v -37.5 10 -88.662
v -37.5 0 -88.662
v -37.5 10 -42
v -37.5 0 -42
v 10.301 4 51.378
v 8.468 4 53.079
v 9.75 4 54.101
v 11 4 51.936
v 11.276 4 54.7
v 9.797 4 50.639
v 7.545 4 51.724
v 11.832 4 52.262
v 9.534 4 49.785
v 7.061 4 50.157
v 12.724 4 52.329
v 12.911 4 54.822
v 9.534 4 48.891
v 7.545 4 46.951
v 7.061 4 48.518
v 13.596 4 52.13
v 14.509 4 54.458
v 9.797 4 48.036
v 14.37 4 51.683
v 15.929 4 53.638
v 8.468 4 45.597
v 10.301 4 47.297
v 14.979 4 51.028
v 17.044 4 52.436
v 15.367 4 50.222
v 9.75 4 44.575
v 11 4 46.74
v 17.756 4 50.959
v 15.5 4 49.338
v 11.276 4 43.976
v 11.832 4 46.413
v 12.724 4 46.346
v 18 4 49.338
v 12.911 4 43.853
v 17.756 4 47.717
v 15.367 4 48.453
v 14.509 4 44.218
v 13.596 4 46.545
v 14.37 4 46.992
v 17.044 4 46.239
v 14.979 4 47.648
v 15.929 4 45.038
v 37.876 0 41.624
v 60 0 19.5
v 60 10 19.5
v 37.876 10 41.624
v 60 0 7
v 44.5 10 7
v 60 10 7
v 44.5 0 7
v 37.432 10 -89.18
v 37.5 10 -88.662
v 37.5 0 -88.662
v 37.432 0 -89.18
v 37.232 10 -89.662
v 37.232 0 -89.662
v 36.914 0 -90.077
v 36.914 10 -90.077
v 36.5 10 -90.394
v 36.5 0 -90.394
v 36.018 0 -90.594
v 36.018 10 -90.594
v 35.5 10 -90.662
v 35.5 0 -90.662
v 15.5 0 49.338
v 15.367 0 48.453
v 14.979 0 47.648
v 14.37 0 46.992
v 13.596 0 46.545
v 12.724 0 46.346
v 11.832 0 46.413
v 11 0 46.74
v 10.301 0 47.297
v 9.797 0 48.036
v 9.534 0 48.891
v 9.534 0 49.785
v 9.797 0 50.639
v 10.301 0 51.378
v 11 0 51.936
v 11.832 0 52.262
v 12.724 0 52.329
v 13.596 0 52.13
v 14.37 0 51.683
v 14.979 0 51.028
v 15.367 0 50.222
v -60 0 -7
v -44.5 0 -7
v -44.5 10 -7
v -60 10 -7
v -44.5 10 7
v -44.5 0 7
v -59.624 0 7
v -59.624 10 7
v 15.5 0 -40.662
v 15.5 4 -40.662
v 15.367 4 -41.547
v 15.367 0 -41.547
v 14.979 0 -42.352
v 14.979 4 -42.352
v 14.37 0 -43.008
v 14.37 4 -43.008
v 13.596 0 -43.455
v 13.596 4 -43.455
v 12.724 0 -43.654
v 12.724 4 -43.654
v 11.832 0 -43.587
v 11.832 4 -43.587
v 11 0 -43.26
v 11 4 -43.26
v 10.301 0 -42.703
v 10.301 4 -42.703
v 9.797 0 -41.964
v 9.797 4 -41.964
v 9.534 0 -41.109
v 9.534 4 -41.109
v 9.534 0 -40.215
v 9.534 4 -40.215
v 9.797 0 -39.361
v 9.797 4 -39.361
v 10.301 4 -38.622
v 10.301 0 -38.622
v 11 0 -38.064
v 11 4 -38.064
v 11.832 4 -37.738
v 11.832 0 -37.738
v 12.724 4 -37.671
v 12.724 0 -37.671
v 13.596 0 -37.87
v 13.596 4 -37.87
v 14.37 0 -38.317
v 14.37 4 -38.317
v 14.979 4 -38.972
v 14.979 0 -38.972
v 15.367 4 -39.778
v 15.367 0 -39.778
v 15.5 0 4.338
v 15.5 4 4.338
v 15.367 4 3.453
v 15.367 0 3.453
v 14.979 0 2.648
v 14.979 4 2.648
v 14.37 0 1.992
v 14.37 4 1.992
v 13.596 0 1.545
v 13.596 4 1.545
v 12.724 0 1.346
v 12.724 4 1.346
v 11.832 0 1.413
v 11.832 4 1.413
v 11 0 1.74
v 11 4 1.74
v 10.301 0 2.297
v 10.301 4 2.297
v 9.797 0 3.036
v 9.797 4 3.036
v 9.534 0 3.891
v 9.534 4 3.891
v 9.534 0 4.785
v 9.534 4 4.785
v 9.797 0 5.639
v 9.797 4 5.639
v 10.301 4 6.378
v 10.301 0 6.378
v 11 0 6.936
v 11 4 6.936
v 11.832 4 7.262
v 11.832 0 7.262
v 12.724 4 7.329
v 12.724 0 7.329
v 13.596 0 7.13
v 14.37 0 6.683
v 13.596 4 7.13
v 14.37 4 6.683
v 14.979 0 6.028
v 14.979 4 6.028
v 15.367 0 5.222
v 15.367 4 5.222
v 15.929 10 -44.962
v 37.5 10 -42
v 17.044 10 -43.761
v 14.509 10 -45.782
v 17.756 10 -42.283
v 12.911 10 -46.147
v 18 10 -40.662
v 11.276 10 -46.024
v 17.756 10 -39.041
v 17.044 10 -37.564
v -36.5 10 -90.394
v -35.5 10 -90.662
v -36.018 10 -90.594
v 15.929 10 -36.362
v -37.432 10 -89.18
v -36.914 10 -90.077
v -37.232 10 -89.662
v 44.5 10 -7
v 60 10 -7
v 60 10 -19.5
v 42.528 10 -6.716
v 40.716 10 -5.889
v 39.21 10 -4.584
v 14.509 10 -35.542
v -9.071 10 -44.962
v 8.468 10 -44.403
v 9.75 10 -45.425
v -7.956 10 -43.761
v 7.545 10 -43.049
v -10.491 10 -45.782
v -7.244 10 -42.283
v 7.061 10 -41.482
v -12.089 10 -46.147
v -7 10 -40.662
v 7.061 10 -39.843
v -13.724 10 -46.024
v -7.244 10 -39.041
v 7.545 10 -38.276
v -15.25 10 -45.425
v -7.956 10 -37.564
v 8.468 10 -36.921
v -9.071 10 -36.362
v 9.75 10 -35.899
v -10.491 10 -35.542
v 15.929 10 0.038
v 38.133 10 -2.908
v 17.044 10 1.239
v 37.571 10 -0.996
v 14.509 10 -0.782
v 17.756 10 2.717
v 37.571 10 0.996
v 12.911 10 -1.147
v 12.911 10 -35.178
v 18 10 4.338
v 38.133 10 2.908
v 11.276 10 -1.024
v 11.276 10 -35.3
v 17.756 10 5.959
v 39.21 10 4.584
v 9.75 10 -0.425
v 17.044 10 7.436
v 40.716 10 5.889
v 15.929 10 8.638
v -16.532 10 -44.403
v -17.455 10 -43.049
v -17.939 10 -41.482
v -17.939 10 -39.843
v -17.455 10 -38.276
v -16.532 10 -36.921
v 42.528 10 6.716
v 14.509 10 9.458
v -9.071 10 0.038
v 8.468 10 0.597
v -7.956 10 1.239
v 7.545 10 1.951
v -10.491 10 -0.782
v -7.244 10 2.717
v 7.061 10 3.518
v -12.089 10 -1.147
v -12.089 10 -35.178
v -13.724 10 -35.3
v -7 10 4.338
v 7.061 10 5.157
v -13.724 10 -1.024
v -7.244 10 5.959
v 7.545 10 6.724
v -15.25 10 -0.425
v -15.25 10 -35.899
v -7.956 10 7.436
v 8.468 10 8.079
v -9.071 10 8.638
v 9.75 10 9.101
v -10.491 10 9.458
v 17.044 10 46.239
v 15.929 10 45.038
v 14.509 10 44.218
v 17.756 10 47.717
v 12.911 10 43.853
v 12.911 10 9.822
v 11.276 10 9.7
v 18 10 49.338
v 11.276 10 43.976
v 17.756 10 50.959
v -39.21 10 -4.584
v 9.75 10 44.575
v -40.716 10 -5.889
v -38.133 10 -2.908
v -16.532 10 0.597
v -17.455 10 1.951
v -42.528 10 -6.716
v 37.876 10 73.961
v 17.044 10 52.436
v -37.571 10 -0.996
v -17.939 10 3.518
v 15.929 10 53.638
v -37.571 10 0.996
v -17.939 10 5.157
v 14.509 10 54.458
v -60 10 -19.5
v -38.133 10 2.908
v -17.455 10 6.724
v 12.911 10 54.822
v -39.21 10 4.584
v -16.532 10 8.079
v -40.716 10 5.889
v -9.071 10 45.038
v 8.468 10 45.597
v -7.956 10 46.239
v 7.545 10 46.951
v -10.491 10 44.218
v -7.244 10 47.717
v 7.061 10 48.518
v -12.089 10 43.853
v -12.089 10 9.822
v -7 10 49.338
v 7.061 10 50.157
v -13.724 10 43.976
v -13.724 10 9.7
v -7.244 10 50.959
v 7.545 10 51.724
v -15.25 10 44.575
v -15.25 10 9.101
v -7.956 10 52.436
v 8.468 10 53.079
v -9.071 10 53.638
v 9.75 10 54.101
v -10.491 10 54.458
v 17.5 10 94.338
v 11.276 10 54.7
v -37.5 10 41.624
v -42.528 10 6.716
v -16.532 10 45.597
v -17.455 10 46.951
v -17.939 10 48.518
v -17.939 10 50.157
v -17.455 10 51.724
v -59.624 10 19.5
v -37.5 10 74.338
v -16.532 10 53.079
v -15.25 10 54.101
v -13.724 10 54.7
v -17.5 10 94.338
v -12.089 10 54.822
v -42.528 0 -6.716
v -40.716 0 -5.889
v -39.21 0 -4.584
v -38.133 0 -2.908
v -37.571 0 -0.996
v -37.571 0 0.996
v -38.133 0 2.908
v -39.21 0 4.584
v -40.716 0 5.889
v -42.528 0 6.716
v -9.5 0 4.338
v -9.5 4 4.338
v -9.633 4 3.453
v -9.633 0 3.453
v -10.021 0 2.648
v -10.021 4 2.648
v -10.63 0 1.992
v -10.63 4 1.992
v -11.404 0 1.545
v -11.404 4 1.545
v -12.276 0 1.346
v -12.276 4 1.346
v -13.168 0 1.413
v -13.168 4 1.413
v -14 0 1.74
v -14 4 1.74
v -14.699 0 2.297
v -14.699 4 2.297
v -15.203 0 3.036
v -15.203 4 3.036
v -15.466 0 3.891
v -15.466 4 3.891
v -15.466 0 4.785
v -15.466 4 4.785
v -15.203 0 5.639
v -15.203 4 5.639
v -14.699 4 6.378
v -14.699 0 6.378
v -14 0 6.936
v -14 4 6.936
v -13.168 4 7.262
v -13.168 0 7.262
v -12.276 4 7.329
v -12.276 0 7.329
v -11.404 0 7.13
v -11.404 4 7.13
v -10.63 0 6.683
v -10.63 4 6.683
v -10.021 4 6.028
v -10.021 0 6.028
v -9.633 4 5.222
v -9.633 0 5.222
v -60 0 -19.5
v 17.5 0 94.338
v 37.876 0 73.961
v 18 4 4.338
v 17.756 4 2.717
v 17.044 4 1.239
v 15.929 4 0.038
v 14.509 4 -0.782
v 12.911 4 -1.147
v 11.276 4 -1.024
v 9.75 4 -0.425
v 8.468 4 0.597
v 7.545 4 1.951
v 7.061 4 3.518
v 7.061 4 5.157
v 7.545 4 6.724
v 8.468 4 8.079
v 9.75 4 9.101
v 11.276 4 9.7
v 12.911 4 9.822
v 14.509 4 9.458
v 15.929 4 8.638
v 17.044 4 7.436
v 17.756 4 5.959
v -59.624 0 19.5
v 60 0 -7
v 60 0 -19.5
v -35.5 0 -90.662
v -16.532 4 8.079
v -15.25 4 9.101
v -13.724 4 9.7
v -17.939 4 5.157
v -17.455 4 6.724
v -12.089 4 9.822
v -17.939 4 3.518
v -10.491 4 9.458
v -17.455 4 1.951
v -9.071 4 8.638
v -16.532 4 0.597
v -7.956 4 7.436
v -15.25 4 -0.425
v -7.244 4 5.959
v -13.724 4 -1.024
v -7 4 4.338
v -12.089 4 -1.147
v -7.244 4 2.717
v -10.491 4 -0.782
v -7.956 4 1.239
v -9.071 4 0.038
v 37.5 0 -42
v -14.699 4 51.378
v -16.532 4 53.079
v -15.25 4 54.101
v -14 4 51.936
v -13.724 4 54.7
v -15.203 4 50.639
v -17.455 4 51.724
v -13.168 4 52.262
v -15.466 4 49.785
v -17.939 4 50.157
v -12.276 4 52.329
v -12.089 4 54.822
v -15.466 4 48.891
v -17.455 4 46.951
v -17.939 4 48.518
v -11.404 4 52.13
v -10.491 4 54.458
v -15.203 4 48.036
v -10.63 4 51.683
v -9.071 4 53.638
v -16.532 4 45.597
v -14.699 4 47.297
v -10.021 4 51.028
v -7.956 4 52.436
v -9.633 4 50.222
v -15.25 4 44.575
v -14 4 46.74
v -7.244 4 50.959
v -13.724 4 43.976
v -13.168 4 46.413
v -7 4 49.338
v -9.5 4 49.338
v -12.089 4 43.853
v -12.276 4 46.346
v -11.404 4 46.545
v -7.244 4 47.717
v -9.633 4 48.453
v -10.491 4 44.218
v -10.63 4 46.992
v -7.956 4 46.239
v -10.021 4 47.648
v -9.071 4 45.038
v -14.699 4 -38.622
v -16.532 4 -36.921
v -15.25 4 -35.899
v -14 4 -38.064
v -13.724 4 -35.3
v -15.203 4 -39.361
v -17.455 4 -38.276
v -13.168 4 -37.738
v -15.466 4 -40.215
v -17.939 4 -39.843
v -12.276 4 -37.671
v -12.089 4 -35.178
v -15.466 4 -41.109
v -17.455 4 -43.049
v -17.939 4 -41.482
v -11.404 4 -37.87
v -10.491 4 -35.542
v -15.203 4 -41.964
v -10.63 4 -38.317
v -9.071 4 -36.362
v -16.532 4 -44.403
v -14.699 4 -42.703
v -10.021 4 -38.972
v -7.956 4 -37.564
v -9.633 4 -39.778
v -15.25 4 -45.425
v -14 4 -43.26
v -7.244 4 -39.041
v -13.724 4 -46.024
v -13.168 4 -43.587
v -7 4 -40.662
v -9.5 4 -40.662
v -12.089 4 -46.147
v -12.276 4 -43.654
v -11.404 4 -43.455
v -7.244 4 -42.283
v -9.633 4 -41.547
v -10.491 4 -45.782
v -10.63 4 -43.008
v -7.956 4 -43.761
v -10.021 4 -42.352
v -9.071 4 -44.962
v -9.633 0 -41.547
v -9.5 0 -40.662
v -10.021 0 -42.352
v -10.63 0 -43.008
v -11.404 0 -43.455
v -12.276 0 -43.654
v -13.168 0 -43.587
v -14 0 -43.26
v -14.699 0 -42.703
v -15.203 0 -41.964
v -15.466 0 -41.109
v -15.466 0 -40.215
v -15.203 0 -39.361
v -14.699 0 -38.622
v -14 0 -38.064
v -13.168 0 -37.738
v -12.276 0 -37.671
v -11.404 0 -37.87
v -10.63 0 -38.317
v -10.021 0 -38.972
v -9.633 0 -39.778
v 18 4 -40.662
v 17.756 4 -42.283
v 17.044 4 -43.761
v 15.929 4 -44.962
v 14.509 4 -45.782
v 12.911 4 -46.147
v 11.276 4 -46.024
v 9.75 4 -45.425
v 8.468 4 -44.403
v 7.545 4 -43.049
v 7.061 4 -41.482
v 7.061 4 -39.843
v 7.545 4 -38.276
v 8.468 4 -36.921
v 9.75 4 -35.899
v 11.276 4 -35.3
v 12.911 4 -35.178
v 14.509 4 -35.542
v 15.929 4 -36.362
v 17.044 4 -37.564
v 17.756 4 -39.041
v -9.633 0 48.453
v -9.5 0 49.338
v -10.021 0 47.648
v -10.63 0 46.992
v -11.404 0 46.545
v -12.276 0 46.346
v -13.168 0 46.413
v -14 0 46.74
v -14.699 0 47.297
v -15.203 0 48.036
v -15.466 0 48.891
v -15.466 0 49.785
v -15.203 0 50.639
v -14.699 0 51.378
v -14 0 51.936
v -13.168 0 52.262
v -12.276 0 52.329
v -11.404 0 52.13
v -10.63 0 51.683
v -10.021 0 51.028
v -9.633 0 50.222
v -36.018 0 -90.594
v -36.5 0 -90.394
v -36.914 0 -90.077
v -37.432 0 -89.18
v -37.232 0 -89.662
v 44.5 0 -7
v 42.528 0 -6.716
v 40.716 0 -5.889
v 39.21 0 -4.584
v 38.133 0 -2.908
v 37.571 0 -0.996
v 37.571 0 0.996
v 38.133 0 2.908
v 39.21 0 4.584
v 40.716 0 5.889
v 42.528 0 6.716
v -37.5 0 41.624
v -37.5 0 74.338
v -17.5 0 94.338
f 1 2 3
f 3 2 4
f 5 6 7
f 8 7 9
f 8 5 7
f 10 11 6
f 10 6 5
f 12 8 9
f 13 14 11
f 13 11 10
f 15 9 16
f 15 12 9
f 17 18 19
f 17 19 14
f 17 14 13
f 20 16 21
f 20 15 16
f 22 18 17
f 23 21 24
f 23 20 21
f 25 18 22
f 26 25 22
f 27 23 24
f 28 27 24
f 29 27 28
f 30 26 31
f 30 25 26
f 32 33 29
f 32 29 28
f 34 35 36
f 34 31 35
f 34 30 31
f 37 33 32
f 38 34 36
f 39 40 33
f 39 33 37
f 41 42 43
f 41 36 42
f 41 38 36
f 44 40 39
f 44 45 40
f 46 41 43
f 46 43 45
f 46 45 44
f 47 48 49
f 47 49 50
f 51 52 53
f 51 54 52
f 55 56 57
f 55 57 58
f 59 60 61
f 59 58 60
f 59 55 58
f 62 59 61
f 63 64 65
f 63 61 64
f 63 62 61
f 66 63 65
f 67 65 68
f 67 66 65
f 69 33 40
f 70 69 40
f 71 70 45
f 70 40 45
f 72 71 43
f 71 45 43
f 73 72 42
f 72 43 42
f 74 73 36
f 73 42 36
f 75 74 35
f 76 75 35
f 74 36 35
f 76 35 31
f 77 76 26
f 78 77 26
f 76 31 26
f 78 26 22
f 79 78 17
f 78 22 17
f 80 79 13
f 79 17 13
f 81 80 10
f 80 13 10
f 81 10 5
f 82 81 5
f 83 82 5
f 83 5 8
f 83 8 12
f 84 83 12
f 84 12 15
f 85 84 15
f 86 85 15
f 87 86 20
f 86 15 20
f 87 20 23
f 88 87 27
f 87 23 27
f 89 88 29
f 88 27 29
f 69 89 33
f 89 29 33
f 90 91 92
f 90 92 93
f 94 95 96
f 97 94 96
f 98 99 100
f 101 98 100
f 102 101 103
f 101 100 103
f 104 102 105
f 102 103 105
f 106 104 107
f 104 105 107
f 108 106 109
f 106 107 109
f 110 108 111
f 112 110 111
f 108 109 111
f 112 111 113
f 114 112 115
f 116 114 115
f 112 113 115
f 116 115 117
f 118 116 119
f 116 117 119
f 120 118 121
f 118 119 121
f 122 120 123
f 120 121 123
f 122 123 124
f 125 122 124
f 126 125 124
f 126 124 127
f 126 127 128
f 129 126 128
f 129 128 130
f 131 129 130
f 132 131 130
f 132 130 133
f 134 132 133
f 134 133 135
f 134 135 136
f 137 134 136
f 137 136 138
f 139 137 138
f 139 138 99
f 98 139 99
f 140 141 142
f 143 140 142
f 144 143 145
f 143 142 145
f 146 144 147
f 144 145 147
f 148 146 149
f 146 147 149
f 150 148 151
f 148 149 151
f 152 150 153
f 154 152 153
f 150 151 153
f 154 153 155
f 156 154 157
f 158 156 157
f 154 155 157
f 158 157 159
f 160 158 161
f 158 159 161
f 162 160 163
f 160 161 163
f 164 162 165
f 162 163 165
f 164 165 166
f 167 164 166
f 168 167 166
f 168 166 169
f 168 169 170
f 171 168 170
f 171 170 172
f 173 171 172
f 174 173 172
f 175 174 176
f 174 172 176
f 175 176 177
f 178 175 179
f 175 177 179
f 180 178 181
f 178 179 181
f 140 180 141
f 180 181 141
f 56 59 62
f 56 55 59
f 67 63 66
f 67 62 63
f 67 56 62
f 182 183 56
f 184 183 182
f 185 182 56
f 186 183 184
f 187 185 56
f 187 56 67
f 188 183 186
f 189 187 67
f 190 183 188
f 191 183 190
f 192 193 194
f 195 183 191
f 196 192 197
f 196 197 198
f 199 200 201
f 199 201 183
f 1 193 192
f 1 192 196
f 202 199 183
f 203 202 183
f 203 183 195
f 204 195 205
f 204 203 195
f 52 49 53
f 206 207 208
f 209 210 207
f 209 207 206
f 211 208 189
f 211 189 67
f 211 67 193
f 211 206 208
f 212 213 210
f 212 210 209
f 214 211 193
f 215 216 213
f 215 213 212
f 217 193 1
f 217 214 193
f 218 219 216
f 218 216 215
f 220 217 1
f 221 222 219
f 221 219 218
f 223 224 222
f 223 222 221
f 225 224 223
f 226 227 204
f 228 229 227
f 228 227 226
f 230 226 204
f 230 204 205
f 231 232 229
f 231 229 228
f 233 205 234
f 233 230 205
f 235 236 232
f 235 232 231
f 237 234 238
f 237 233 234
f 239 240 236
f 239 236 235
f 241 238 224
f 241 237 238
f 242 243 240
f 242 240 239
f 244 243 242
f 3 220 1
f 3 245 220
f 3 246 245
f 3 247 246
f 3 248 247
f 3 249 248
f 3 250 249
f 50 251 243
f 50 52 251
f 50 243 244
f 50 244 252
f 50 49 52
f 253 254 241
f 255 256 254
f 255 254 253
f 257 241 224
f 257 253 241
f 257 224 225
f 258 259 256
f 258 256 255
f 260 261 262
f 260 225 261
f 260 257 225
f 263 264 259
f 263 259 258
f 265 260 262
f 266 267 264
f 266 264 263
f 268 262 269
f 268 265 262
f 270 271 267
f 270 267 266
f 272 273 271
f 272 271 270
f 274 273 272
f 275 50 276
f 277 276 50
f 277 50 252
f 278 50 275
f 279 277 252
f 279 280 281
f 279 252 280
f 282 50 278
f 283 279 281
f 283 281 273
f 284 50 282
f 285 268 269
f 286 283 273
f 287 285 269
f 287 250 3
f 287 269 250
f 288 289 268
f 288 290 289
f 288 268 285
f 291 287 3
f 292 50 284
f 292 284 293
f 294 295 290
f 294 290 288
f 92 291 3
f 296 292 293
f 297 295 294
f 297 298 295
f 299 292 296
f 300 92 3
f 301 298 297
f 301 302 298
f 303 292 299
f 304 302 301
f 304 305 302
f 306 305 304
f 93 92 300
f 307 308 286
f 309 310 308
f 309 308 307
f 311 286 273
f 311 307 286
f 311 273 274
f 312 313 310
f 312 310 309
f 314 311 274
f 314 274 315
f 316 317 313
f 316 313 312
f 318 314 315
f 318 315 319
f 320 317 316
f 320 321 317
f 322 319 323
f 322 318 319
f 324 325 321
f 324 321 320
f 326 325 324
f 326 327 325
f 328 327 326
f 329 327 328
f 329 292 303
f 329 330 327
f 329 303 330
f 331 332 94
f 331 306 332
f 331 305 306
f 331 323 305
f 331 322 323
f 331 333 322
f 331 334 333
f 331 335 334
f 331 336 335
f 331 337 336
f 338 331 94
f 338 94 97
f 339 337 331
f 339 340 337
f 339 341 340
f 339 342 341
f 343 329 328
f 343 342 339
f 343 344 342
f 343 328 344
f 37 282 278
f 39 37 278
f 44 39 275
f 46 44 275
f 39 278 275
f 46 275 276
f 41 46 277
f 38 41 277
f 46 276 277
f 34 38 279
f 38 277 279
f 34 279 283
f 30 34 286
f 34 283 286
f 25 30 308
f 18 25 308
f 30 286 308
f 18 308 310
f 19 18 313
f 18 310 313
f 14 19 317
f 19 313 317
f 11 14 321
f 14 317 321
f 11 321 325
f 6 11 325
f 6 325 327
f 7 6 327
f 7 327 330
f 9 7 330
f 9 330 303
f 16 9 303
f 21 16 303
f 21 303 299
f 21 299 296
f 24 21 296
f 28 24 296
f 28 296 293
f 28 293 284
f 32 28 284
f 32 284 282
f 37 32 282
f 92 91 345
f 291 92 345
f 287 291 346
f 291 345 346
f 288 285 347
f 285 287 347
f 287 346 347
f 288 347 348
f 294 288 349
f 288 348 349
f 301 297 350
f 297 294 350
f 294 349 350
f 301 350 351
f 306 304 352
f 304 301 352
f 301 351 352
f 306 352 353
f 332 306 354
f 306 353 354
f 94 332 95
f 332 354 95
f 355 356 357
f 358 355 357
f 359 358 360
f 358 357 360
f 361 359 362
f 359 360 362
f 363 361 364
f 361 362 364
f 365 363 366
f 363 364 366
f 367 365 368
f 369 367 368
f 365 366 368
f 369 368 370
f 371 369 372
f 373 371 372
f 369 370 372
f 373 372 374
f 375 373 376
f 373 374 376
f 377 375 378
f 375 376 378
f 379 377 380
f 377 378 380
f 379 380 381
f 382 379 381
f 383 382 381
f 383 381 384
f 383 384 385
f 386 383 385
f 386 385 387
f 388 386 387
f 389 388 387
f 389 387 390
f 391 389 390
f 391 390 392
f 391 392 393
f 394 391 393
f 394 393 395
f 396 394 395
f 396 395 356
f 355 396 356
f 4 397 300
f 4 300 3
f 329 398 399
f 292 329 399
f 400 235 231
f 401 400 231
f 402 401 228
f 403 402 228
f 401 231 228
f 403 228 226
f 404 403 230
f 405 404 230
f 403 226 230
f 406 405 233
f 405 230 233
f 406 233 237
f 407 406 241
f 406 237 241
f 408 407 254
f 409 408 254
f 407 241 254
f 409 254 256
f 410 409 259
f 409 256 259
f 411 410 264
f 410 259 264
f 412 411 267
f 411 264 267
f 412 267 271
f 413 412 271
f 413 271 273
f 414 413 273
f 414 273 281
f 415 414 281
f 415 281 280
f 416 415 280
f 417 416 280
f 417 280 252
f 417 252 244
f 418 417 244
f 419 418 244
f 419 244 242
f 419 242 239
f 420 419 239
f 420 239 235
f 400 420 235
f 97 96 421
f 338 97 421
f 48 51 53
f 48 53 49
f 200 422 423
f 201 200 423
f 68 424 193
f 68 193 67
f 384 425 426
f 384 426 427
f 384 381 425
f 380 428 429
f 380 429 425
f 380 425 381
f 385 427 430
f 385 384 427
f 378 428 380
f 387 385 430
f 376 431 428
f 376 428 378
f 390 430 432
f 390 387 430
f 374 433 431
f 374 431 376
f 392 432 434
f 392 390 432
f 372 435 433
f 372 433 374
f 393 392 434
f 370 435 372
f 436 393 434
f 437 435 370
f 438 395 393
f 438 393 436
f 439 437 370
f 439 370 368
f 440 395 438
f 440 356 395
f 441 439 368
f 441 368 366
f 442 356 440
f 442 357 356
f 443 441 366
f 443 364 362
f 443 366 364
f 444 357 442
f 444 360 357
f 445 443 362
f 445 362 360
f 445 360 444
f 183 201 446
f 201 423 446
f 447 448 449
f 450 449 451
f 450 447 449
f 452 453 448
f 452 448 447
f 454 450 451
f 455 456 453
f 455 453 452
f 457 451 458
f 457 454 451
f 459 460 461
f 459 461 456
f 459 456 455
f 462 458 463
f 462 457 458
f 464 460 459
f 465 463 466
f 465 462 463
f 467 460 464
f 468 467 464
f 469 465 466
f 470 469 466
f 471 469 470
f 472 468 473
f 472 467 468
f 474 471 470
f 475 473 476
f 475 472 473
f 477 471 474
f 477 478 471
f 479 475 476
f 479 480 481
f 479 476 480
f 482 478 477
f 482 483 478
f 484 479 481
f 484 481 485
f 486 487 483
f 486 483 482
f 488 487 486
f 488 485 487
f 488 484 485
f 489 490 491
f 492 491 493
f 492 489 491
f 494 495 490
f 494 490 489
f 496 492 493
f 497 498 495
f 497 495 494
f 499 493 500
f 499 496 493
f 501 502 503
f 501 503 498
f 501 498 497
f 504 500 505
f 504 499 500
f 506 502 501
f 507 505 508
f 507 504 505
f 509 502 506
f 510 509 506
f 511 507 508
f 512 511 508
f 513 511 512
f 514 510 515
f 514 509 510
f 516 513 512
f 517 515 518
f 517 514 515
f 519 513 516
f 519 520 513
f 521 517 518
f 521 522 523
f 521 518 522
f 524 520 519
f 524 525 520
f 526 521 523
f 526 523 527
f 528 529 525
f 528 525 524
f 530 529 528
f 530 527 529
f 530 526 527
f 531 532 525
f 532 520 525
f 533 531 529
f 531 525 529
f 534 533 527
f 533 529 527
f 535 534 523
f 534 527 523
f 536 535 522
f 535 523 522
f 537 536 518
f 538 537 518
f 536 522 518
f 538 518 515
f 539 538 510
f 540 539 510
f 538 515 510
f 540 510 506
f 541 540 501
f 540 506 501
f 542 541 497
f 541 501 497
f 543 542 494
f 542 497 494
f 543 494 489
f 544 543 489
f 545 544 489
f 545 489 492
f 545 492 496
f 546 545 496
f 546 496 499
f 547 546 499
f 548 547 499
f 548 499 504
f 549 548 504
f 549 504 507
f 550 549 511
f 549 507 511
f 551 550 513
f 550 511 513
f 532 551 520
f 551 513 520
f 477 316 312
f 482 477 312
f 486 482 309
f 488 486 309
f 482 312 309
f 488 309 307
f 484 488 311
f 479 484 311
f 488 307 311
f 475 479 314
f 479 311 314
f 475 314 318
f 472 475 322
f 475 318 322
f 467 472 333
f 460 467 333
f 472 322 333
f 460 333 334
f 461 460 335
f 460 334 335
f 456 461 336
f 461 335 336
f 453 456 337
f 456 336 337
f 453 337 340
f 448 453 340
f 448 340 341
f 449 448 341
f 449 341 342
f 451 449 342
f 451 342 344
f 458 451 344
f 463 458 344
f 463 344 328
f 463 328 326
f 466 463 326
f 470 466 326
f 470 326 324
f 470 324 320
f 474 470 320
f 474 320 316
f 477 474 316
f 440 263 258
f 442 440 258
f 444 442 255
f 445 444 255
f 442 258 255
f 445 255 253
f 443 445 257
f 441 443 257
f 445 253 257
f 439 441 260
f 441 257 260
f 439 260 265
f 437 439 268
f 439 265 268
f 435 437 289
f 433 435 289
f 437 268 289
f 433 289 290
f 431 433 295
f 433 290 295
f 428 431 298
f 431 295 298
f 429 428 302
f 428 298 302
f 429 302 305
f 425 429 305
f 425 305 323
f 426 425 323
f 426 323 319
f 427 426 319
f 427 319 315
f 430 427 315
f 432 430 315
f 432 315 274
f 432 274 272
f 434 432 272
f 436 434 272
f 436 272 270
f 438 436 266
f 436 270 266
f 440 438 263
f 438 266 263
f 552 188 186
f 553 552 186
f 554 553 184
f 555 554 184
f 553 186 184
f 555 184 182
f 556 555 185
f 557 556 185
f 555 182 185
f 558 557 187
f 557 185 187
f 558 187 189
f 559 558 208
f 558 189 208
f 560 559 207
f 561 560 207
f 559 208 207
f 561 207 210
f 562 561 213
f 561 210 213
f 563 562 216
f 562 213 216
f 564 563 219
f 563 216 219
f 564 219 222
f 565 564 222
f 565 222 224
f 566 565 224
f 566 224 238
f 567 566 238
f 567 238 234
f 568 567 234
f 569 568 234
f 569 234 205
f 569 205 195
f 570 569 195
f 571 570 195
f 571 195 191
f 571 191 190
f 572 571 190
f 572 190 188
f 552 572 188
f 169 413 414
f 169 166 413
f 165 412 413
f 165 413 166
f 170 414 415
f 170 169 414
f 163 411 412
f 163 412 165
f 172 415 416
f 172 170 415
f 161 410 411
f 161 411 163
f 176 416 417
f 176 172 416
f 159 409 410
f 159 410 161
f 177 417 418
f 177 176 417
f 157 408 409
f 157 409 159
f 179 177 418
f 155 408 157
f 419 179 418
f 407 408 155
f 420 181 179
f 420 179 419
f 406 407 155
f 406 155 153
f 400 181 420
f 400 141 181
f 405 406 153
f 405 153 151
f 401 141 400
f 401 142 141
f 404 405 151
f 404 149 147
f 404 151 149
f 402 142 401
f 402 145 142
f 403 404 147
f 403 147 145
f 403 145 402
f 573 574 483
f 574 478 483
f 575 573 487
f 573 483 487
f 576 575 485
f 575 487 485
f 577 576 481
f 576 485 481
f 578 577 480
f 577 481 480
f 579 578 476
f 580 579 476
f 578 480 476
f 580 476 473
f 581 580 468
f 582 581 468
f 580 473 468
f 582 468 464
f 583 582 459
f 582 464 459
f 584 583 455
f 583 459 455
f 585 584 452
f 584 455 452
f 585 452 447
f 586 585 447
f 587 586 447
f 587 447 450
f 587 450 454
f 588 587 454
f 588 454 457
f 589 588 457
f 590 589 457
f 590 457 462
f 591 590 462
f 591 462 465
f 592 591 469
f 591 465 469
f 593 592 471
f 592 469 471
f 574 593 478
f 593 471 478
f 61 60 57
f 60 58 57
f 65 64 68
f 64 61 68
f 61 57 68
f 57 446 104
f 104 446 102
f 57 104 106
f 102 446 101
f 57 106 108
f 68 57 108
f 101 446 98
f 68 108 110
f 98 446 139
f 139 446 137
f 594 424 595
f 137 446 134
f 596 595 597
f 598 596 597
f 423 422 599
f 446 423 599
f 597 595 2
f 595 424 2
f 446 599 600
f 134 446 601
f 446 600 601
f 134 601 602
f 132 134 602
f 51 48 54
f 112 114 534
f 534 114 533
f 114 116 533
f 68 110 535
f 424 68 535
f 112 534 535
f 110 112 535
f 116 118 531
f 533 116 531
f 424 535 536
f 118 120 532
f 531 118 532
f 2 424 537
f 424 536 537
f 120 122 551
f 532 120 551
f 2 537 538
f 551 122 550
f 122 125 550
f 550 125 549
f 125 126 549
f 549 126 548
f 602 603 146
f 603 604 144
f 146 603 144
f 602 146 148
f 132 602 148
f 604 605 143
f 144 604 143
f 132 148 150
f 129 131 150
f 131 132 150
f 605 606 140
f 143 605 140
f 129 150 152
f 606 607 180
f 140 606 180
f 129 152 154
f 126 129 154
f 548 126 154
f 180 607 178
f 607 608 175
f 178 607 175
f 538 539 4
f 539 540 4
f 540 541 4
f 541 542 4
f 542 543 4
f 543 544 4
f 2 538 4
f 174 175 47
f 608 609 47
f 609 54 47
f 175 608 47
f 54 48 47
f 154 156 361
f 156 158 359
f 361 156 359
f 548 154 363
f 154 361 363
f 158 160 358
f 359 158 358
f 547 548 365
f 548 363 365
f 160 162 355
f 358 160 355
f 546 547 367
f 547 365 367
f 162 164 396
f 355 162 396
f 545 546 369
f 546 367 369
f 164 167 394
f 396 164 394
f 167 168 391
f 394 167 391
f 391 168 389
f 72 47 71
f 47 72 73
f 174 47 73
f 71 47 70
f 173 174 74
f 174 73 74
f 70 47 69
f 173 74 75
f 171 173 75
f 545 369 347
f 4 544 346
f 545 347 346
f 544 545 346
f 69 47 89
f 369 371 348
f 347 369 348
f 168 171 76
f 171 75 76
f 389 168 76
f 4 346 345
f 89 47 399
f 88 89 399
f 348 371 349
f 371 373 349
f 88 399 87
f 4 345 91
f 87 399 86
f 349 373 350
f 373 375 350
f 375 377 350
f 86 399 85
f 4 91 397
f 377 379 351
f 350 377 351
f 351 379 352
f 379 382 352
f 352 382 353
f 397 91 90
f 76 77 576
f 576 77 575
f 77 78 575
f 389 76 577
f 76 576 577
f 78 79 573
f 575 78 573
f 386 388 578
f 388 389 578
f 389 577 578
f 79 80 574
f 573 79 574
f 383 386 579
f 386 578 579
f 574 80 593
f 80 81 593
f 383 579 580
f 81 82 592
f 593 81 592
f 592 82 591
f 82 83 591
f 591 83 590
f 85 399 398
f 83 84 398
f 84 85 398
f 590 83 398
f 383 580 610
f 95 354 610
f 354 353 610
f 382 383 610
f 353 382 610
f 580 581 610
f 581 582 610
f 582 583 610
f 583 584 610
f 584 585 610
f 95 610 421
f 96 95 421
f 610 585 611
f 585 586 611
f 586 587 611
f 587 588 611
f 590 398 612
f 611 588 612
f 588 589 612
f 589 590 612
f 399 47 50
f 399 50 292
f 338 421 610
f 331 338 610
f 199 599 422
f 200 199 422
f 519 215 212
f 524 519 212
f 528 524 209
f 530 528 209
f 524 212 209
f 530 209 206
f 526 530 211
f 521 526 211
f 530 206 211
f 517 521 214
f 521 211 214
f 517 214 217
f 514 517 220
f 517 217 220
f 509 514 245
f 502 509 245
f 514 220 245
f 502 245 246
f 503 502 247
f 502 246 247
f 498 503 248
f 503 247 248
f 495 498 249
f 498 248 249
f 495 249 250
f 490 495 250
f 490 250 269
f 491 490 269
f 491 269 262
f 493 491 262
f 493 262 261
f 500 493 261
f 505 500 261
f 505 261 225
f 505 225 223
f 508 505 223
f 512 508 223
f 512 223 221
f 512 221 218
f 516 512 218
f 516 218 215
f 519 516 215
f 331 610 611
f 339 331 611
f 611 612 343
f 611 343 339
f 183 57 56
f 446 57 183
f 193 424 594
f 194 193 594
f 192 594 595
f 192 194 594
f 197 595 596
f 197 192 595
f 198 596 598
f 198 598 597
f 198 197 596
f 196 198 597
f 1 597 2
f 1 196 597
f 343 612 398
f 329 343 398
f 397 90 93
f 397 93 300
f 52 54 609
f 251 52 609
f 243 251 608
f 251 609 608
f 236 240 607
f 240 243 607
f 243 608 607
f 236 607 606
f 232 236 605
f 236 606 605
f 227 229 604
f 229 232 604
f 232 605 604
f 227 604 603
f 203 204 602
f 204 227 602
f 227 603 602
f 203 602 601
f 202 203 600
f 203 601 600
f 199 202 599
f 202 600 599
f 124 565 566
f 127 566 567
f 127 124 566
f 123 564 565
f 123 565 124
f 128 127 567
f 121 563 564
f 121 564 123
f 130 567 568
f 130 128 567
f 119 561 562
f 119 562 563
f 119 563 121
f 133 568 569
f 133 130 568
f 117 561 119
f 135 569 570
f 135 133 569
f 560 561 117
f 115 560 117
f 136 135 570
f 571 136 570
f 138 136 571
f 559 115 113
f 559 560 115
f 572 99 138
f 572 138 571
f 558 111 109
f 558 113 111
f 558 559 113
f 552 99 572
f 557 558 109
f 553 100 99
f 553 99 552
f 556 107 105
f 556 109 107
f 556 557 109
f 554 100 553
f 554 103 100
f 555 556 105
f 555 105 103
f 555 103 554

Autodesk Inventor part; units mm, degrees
ref_plane "YZ Plane" through (0, 0, 0) normal (1, 0, 0) x (0, 1, 0)
ref_plane "XZ Plane" through (0, 0, 0) normal (0, 1, 0) x (-1, 0, 0)
ref_plane "XY Plane" through (0, 0, 0) normal (0, 0, 1) x (1, 0, 0)
sketch "Sketch1" plane through (0, 0, 0) normal (0, 1, 0) x (-1, 0, 0)
  arc A0 (-44.5, -7) -> (-44.5, 7) centre (-44.5, 0) ccw
  arc A1 (44.5, 7) -> (44.5, -7) centre (44.5, 0) ccw
  line L0 (44.5, 7) -> (59.6236, 7)
  line L1 (44.5, -7) -> (60, -7)
  line L2 (-44.5, 7) -> (-60, 7)
  line L3 (-44.5, -7) -> (-60, -7)
  line L4 (60, -7) -> (60, -19.5)
  line L5 (-60, 7) -> (-60, 19.5)
  line L6 (59.6236, 7) -> (59.6236, 19.5)
  line L7 (-60, -7) -> (-60, -19.5)
  line L8 (37.5, -90.6623) -> (-37.5, -90.6623)
  line L9 (17.5, 94.3377) -> (-17.5, 94.3377)
  line L10 (60, -19.5) -> (37.5, -42)
  line L11 (-60, -19.5) -> (-37.5, -42)
  line L12 (37.5, -90.6623) -> (37.5, -42)
  line L13 (-37.5, -90.6623) -> (-37.5, -42)
  line L14 (59.6236, 19.5) -> (37.5, 41.6236)
  line L15 (-60, 19.5) -> (-37.8764, 41.6236)
  line L16 (37.5, 41.6236) -> (37.5, 74.3377)
  line L17 (-37.8764, 41.6236) -> (-37.8764, 73.9613)
  line L18 (17.5, 94.3377) -> (37.5, 74.3377)
  line L19 (-17.5, 94.3377) -> (-37.8764, 73.9613)
  point P0 (0, 0)
  dimension "d0" = 89
  dimension "d1" = 44.5
  dimension "d5" = 60
  dimension "d10" = 39
  dimension "d11" = 19.5
  dimension "d12" = 19.5
  dimension "d13" = 39
  dimension "d14" = 19.5
  dimension "d15" = 19.5
  dimension "d16" = 75
  dimension "d17" = 37.5
  dimension "d18" = 35
  dimension "d19" = 17.5
  dimension "d20" = 185
  dimension "d22" = 45
  dimension "d23" = 45
  dimension "d24" = 45
  dimension "d25" = 45
  dimension "d28" = 45
  dimension "d29" = 45
extrude "Extrusion1" add sketch "Sketch1" along normal blind 10
sketch "Sketch2" plane through (0, 10, 0) normal (0, 1, 0) x (1, 0, 0)
  circle A0 centre (-12.5, 40.6623) radius 5.5
  circle A1 centre (-12.5, -4.3377) radius 5.5
  circle A2 centre (-12.5, -49.3377) radius 5.5
  line L0 (37.5, 90.6623) -> (-37.5, 90.6623) projected
  circle A3 centre (12.5, -49.3377) radius 5.5
  circle A4 centre (12.5, -4.3377) radius 5.5
  circle A5 centre (12.5, 40.6623) radius 5.5
  point P0 (0, 0)
  dimension "d32" = 11
  dimension "d33" = 11
  dimension "d34" = 11
  dimension "d35" = 50
  dimension "d36" = 45
  dimension "d37" = 45
  dimension "d38" = 11
  dimension "d39" = 11
  dimension "d40" = 11
  dimension "d41" = 25
  dimension "d42" = 12.5
  dimension "d43" = 12.5
  dimension "d44" = 12.5
  dimension "d45" = 12.5
  dimension "d46" = 12.5
extrude "Extrusion2" cut sketch "Sketch2" against normal blind 6
sketch "Sketch3" plane through (-12.5, 4, 4.3377) normal (0, 1, 0) x (1, 0, 0)
  circle A0 centre (0, 0) radius 3
  circle A1 centre (25, 0) radius 5.5 projected
  circle A2 centre (25, 0) radius 3
  circle A3 centre (0, -45) radius 5.5 projected
  circle A4 centre (0, -45) radius 3
  circle A5 centre (0, 45) radius 5.5 projected
  circle A6 centre (25, 45) radius 5.5 projected
  circle A7 centre (25, -45) radius 3
  circle A8 centre (25, 45) radius 3
  circle A9 centre (0, 45) radius 3
  point P0 (12.5, 4.3377)
  dimension "d51" = 6
  dimension "d52" = 6
  dimension "d53" = 6
  dimension "d55" = 6
  dimension "d56" = 6
  dimension "d57" = 6
extrude "Extrusion3" cut sketch "Sketch3" against normal blind 6 contours A0 | A2 | A4 | A7 | A8 | A9
fillet "Fillet1" radius 2 1 edges at (-37.5, 5, -90.6623)
fillet "Fillet2" radius 2 1 edges at (37.5, 5, -90.6623)
properties part number "Groundplate"
